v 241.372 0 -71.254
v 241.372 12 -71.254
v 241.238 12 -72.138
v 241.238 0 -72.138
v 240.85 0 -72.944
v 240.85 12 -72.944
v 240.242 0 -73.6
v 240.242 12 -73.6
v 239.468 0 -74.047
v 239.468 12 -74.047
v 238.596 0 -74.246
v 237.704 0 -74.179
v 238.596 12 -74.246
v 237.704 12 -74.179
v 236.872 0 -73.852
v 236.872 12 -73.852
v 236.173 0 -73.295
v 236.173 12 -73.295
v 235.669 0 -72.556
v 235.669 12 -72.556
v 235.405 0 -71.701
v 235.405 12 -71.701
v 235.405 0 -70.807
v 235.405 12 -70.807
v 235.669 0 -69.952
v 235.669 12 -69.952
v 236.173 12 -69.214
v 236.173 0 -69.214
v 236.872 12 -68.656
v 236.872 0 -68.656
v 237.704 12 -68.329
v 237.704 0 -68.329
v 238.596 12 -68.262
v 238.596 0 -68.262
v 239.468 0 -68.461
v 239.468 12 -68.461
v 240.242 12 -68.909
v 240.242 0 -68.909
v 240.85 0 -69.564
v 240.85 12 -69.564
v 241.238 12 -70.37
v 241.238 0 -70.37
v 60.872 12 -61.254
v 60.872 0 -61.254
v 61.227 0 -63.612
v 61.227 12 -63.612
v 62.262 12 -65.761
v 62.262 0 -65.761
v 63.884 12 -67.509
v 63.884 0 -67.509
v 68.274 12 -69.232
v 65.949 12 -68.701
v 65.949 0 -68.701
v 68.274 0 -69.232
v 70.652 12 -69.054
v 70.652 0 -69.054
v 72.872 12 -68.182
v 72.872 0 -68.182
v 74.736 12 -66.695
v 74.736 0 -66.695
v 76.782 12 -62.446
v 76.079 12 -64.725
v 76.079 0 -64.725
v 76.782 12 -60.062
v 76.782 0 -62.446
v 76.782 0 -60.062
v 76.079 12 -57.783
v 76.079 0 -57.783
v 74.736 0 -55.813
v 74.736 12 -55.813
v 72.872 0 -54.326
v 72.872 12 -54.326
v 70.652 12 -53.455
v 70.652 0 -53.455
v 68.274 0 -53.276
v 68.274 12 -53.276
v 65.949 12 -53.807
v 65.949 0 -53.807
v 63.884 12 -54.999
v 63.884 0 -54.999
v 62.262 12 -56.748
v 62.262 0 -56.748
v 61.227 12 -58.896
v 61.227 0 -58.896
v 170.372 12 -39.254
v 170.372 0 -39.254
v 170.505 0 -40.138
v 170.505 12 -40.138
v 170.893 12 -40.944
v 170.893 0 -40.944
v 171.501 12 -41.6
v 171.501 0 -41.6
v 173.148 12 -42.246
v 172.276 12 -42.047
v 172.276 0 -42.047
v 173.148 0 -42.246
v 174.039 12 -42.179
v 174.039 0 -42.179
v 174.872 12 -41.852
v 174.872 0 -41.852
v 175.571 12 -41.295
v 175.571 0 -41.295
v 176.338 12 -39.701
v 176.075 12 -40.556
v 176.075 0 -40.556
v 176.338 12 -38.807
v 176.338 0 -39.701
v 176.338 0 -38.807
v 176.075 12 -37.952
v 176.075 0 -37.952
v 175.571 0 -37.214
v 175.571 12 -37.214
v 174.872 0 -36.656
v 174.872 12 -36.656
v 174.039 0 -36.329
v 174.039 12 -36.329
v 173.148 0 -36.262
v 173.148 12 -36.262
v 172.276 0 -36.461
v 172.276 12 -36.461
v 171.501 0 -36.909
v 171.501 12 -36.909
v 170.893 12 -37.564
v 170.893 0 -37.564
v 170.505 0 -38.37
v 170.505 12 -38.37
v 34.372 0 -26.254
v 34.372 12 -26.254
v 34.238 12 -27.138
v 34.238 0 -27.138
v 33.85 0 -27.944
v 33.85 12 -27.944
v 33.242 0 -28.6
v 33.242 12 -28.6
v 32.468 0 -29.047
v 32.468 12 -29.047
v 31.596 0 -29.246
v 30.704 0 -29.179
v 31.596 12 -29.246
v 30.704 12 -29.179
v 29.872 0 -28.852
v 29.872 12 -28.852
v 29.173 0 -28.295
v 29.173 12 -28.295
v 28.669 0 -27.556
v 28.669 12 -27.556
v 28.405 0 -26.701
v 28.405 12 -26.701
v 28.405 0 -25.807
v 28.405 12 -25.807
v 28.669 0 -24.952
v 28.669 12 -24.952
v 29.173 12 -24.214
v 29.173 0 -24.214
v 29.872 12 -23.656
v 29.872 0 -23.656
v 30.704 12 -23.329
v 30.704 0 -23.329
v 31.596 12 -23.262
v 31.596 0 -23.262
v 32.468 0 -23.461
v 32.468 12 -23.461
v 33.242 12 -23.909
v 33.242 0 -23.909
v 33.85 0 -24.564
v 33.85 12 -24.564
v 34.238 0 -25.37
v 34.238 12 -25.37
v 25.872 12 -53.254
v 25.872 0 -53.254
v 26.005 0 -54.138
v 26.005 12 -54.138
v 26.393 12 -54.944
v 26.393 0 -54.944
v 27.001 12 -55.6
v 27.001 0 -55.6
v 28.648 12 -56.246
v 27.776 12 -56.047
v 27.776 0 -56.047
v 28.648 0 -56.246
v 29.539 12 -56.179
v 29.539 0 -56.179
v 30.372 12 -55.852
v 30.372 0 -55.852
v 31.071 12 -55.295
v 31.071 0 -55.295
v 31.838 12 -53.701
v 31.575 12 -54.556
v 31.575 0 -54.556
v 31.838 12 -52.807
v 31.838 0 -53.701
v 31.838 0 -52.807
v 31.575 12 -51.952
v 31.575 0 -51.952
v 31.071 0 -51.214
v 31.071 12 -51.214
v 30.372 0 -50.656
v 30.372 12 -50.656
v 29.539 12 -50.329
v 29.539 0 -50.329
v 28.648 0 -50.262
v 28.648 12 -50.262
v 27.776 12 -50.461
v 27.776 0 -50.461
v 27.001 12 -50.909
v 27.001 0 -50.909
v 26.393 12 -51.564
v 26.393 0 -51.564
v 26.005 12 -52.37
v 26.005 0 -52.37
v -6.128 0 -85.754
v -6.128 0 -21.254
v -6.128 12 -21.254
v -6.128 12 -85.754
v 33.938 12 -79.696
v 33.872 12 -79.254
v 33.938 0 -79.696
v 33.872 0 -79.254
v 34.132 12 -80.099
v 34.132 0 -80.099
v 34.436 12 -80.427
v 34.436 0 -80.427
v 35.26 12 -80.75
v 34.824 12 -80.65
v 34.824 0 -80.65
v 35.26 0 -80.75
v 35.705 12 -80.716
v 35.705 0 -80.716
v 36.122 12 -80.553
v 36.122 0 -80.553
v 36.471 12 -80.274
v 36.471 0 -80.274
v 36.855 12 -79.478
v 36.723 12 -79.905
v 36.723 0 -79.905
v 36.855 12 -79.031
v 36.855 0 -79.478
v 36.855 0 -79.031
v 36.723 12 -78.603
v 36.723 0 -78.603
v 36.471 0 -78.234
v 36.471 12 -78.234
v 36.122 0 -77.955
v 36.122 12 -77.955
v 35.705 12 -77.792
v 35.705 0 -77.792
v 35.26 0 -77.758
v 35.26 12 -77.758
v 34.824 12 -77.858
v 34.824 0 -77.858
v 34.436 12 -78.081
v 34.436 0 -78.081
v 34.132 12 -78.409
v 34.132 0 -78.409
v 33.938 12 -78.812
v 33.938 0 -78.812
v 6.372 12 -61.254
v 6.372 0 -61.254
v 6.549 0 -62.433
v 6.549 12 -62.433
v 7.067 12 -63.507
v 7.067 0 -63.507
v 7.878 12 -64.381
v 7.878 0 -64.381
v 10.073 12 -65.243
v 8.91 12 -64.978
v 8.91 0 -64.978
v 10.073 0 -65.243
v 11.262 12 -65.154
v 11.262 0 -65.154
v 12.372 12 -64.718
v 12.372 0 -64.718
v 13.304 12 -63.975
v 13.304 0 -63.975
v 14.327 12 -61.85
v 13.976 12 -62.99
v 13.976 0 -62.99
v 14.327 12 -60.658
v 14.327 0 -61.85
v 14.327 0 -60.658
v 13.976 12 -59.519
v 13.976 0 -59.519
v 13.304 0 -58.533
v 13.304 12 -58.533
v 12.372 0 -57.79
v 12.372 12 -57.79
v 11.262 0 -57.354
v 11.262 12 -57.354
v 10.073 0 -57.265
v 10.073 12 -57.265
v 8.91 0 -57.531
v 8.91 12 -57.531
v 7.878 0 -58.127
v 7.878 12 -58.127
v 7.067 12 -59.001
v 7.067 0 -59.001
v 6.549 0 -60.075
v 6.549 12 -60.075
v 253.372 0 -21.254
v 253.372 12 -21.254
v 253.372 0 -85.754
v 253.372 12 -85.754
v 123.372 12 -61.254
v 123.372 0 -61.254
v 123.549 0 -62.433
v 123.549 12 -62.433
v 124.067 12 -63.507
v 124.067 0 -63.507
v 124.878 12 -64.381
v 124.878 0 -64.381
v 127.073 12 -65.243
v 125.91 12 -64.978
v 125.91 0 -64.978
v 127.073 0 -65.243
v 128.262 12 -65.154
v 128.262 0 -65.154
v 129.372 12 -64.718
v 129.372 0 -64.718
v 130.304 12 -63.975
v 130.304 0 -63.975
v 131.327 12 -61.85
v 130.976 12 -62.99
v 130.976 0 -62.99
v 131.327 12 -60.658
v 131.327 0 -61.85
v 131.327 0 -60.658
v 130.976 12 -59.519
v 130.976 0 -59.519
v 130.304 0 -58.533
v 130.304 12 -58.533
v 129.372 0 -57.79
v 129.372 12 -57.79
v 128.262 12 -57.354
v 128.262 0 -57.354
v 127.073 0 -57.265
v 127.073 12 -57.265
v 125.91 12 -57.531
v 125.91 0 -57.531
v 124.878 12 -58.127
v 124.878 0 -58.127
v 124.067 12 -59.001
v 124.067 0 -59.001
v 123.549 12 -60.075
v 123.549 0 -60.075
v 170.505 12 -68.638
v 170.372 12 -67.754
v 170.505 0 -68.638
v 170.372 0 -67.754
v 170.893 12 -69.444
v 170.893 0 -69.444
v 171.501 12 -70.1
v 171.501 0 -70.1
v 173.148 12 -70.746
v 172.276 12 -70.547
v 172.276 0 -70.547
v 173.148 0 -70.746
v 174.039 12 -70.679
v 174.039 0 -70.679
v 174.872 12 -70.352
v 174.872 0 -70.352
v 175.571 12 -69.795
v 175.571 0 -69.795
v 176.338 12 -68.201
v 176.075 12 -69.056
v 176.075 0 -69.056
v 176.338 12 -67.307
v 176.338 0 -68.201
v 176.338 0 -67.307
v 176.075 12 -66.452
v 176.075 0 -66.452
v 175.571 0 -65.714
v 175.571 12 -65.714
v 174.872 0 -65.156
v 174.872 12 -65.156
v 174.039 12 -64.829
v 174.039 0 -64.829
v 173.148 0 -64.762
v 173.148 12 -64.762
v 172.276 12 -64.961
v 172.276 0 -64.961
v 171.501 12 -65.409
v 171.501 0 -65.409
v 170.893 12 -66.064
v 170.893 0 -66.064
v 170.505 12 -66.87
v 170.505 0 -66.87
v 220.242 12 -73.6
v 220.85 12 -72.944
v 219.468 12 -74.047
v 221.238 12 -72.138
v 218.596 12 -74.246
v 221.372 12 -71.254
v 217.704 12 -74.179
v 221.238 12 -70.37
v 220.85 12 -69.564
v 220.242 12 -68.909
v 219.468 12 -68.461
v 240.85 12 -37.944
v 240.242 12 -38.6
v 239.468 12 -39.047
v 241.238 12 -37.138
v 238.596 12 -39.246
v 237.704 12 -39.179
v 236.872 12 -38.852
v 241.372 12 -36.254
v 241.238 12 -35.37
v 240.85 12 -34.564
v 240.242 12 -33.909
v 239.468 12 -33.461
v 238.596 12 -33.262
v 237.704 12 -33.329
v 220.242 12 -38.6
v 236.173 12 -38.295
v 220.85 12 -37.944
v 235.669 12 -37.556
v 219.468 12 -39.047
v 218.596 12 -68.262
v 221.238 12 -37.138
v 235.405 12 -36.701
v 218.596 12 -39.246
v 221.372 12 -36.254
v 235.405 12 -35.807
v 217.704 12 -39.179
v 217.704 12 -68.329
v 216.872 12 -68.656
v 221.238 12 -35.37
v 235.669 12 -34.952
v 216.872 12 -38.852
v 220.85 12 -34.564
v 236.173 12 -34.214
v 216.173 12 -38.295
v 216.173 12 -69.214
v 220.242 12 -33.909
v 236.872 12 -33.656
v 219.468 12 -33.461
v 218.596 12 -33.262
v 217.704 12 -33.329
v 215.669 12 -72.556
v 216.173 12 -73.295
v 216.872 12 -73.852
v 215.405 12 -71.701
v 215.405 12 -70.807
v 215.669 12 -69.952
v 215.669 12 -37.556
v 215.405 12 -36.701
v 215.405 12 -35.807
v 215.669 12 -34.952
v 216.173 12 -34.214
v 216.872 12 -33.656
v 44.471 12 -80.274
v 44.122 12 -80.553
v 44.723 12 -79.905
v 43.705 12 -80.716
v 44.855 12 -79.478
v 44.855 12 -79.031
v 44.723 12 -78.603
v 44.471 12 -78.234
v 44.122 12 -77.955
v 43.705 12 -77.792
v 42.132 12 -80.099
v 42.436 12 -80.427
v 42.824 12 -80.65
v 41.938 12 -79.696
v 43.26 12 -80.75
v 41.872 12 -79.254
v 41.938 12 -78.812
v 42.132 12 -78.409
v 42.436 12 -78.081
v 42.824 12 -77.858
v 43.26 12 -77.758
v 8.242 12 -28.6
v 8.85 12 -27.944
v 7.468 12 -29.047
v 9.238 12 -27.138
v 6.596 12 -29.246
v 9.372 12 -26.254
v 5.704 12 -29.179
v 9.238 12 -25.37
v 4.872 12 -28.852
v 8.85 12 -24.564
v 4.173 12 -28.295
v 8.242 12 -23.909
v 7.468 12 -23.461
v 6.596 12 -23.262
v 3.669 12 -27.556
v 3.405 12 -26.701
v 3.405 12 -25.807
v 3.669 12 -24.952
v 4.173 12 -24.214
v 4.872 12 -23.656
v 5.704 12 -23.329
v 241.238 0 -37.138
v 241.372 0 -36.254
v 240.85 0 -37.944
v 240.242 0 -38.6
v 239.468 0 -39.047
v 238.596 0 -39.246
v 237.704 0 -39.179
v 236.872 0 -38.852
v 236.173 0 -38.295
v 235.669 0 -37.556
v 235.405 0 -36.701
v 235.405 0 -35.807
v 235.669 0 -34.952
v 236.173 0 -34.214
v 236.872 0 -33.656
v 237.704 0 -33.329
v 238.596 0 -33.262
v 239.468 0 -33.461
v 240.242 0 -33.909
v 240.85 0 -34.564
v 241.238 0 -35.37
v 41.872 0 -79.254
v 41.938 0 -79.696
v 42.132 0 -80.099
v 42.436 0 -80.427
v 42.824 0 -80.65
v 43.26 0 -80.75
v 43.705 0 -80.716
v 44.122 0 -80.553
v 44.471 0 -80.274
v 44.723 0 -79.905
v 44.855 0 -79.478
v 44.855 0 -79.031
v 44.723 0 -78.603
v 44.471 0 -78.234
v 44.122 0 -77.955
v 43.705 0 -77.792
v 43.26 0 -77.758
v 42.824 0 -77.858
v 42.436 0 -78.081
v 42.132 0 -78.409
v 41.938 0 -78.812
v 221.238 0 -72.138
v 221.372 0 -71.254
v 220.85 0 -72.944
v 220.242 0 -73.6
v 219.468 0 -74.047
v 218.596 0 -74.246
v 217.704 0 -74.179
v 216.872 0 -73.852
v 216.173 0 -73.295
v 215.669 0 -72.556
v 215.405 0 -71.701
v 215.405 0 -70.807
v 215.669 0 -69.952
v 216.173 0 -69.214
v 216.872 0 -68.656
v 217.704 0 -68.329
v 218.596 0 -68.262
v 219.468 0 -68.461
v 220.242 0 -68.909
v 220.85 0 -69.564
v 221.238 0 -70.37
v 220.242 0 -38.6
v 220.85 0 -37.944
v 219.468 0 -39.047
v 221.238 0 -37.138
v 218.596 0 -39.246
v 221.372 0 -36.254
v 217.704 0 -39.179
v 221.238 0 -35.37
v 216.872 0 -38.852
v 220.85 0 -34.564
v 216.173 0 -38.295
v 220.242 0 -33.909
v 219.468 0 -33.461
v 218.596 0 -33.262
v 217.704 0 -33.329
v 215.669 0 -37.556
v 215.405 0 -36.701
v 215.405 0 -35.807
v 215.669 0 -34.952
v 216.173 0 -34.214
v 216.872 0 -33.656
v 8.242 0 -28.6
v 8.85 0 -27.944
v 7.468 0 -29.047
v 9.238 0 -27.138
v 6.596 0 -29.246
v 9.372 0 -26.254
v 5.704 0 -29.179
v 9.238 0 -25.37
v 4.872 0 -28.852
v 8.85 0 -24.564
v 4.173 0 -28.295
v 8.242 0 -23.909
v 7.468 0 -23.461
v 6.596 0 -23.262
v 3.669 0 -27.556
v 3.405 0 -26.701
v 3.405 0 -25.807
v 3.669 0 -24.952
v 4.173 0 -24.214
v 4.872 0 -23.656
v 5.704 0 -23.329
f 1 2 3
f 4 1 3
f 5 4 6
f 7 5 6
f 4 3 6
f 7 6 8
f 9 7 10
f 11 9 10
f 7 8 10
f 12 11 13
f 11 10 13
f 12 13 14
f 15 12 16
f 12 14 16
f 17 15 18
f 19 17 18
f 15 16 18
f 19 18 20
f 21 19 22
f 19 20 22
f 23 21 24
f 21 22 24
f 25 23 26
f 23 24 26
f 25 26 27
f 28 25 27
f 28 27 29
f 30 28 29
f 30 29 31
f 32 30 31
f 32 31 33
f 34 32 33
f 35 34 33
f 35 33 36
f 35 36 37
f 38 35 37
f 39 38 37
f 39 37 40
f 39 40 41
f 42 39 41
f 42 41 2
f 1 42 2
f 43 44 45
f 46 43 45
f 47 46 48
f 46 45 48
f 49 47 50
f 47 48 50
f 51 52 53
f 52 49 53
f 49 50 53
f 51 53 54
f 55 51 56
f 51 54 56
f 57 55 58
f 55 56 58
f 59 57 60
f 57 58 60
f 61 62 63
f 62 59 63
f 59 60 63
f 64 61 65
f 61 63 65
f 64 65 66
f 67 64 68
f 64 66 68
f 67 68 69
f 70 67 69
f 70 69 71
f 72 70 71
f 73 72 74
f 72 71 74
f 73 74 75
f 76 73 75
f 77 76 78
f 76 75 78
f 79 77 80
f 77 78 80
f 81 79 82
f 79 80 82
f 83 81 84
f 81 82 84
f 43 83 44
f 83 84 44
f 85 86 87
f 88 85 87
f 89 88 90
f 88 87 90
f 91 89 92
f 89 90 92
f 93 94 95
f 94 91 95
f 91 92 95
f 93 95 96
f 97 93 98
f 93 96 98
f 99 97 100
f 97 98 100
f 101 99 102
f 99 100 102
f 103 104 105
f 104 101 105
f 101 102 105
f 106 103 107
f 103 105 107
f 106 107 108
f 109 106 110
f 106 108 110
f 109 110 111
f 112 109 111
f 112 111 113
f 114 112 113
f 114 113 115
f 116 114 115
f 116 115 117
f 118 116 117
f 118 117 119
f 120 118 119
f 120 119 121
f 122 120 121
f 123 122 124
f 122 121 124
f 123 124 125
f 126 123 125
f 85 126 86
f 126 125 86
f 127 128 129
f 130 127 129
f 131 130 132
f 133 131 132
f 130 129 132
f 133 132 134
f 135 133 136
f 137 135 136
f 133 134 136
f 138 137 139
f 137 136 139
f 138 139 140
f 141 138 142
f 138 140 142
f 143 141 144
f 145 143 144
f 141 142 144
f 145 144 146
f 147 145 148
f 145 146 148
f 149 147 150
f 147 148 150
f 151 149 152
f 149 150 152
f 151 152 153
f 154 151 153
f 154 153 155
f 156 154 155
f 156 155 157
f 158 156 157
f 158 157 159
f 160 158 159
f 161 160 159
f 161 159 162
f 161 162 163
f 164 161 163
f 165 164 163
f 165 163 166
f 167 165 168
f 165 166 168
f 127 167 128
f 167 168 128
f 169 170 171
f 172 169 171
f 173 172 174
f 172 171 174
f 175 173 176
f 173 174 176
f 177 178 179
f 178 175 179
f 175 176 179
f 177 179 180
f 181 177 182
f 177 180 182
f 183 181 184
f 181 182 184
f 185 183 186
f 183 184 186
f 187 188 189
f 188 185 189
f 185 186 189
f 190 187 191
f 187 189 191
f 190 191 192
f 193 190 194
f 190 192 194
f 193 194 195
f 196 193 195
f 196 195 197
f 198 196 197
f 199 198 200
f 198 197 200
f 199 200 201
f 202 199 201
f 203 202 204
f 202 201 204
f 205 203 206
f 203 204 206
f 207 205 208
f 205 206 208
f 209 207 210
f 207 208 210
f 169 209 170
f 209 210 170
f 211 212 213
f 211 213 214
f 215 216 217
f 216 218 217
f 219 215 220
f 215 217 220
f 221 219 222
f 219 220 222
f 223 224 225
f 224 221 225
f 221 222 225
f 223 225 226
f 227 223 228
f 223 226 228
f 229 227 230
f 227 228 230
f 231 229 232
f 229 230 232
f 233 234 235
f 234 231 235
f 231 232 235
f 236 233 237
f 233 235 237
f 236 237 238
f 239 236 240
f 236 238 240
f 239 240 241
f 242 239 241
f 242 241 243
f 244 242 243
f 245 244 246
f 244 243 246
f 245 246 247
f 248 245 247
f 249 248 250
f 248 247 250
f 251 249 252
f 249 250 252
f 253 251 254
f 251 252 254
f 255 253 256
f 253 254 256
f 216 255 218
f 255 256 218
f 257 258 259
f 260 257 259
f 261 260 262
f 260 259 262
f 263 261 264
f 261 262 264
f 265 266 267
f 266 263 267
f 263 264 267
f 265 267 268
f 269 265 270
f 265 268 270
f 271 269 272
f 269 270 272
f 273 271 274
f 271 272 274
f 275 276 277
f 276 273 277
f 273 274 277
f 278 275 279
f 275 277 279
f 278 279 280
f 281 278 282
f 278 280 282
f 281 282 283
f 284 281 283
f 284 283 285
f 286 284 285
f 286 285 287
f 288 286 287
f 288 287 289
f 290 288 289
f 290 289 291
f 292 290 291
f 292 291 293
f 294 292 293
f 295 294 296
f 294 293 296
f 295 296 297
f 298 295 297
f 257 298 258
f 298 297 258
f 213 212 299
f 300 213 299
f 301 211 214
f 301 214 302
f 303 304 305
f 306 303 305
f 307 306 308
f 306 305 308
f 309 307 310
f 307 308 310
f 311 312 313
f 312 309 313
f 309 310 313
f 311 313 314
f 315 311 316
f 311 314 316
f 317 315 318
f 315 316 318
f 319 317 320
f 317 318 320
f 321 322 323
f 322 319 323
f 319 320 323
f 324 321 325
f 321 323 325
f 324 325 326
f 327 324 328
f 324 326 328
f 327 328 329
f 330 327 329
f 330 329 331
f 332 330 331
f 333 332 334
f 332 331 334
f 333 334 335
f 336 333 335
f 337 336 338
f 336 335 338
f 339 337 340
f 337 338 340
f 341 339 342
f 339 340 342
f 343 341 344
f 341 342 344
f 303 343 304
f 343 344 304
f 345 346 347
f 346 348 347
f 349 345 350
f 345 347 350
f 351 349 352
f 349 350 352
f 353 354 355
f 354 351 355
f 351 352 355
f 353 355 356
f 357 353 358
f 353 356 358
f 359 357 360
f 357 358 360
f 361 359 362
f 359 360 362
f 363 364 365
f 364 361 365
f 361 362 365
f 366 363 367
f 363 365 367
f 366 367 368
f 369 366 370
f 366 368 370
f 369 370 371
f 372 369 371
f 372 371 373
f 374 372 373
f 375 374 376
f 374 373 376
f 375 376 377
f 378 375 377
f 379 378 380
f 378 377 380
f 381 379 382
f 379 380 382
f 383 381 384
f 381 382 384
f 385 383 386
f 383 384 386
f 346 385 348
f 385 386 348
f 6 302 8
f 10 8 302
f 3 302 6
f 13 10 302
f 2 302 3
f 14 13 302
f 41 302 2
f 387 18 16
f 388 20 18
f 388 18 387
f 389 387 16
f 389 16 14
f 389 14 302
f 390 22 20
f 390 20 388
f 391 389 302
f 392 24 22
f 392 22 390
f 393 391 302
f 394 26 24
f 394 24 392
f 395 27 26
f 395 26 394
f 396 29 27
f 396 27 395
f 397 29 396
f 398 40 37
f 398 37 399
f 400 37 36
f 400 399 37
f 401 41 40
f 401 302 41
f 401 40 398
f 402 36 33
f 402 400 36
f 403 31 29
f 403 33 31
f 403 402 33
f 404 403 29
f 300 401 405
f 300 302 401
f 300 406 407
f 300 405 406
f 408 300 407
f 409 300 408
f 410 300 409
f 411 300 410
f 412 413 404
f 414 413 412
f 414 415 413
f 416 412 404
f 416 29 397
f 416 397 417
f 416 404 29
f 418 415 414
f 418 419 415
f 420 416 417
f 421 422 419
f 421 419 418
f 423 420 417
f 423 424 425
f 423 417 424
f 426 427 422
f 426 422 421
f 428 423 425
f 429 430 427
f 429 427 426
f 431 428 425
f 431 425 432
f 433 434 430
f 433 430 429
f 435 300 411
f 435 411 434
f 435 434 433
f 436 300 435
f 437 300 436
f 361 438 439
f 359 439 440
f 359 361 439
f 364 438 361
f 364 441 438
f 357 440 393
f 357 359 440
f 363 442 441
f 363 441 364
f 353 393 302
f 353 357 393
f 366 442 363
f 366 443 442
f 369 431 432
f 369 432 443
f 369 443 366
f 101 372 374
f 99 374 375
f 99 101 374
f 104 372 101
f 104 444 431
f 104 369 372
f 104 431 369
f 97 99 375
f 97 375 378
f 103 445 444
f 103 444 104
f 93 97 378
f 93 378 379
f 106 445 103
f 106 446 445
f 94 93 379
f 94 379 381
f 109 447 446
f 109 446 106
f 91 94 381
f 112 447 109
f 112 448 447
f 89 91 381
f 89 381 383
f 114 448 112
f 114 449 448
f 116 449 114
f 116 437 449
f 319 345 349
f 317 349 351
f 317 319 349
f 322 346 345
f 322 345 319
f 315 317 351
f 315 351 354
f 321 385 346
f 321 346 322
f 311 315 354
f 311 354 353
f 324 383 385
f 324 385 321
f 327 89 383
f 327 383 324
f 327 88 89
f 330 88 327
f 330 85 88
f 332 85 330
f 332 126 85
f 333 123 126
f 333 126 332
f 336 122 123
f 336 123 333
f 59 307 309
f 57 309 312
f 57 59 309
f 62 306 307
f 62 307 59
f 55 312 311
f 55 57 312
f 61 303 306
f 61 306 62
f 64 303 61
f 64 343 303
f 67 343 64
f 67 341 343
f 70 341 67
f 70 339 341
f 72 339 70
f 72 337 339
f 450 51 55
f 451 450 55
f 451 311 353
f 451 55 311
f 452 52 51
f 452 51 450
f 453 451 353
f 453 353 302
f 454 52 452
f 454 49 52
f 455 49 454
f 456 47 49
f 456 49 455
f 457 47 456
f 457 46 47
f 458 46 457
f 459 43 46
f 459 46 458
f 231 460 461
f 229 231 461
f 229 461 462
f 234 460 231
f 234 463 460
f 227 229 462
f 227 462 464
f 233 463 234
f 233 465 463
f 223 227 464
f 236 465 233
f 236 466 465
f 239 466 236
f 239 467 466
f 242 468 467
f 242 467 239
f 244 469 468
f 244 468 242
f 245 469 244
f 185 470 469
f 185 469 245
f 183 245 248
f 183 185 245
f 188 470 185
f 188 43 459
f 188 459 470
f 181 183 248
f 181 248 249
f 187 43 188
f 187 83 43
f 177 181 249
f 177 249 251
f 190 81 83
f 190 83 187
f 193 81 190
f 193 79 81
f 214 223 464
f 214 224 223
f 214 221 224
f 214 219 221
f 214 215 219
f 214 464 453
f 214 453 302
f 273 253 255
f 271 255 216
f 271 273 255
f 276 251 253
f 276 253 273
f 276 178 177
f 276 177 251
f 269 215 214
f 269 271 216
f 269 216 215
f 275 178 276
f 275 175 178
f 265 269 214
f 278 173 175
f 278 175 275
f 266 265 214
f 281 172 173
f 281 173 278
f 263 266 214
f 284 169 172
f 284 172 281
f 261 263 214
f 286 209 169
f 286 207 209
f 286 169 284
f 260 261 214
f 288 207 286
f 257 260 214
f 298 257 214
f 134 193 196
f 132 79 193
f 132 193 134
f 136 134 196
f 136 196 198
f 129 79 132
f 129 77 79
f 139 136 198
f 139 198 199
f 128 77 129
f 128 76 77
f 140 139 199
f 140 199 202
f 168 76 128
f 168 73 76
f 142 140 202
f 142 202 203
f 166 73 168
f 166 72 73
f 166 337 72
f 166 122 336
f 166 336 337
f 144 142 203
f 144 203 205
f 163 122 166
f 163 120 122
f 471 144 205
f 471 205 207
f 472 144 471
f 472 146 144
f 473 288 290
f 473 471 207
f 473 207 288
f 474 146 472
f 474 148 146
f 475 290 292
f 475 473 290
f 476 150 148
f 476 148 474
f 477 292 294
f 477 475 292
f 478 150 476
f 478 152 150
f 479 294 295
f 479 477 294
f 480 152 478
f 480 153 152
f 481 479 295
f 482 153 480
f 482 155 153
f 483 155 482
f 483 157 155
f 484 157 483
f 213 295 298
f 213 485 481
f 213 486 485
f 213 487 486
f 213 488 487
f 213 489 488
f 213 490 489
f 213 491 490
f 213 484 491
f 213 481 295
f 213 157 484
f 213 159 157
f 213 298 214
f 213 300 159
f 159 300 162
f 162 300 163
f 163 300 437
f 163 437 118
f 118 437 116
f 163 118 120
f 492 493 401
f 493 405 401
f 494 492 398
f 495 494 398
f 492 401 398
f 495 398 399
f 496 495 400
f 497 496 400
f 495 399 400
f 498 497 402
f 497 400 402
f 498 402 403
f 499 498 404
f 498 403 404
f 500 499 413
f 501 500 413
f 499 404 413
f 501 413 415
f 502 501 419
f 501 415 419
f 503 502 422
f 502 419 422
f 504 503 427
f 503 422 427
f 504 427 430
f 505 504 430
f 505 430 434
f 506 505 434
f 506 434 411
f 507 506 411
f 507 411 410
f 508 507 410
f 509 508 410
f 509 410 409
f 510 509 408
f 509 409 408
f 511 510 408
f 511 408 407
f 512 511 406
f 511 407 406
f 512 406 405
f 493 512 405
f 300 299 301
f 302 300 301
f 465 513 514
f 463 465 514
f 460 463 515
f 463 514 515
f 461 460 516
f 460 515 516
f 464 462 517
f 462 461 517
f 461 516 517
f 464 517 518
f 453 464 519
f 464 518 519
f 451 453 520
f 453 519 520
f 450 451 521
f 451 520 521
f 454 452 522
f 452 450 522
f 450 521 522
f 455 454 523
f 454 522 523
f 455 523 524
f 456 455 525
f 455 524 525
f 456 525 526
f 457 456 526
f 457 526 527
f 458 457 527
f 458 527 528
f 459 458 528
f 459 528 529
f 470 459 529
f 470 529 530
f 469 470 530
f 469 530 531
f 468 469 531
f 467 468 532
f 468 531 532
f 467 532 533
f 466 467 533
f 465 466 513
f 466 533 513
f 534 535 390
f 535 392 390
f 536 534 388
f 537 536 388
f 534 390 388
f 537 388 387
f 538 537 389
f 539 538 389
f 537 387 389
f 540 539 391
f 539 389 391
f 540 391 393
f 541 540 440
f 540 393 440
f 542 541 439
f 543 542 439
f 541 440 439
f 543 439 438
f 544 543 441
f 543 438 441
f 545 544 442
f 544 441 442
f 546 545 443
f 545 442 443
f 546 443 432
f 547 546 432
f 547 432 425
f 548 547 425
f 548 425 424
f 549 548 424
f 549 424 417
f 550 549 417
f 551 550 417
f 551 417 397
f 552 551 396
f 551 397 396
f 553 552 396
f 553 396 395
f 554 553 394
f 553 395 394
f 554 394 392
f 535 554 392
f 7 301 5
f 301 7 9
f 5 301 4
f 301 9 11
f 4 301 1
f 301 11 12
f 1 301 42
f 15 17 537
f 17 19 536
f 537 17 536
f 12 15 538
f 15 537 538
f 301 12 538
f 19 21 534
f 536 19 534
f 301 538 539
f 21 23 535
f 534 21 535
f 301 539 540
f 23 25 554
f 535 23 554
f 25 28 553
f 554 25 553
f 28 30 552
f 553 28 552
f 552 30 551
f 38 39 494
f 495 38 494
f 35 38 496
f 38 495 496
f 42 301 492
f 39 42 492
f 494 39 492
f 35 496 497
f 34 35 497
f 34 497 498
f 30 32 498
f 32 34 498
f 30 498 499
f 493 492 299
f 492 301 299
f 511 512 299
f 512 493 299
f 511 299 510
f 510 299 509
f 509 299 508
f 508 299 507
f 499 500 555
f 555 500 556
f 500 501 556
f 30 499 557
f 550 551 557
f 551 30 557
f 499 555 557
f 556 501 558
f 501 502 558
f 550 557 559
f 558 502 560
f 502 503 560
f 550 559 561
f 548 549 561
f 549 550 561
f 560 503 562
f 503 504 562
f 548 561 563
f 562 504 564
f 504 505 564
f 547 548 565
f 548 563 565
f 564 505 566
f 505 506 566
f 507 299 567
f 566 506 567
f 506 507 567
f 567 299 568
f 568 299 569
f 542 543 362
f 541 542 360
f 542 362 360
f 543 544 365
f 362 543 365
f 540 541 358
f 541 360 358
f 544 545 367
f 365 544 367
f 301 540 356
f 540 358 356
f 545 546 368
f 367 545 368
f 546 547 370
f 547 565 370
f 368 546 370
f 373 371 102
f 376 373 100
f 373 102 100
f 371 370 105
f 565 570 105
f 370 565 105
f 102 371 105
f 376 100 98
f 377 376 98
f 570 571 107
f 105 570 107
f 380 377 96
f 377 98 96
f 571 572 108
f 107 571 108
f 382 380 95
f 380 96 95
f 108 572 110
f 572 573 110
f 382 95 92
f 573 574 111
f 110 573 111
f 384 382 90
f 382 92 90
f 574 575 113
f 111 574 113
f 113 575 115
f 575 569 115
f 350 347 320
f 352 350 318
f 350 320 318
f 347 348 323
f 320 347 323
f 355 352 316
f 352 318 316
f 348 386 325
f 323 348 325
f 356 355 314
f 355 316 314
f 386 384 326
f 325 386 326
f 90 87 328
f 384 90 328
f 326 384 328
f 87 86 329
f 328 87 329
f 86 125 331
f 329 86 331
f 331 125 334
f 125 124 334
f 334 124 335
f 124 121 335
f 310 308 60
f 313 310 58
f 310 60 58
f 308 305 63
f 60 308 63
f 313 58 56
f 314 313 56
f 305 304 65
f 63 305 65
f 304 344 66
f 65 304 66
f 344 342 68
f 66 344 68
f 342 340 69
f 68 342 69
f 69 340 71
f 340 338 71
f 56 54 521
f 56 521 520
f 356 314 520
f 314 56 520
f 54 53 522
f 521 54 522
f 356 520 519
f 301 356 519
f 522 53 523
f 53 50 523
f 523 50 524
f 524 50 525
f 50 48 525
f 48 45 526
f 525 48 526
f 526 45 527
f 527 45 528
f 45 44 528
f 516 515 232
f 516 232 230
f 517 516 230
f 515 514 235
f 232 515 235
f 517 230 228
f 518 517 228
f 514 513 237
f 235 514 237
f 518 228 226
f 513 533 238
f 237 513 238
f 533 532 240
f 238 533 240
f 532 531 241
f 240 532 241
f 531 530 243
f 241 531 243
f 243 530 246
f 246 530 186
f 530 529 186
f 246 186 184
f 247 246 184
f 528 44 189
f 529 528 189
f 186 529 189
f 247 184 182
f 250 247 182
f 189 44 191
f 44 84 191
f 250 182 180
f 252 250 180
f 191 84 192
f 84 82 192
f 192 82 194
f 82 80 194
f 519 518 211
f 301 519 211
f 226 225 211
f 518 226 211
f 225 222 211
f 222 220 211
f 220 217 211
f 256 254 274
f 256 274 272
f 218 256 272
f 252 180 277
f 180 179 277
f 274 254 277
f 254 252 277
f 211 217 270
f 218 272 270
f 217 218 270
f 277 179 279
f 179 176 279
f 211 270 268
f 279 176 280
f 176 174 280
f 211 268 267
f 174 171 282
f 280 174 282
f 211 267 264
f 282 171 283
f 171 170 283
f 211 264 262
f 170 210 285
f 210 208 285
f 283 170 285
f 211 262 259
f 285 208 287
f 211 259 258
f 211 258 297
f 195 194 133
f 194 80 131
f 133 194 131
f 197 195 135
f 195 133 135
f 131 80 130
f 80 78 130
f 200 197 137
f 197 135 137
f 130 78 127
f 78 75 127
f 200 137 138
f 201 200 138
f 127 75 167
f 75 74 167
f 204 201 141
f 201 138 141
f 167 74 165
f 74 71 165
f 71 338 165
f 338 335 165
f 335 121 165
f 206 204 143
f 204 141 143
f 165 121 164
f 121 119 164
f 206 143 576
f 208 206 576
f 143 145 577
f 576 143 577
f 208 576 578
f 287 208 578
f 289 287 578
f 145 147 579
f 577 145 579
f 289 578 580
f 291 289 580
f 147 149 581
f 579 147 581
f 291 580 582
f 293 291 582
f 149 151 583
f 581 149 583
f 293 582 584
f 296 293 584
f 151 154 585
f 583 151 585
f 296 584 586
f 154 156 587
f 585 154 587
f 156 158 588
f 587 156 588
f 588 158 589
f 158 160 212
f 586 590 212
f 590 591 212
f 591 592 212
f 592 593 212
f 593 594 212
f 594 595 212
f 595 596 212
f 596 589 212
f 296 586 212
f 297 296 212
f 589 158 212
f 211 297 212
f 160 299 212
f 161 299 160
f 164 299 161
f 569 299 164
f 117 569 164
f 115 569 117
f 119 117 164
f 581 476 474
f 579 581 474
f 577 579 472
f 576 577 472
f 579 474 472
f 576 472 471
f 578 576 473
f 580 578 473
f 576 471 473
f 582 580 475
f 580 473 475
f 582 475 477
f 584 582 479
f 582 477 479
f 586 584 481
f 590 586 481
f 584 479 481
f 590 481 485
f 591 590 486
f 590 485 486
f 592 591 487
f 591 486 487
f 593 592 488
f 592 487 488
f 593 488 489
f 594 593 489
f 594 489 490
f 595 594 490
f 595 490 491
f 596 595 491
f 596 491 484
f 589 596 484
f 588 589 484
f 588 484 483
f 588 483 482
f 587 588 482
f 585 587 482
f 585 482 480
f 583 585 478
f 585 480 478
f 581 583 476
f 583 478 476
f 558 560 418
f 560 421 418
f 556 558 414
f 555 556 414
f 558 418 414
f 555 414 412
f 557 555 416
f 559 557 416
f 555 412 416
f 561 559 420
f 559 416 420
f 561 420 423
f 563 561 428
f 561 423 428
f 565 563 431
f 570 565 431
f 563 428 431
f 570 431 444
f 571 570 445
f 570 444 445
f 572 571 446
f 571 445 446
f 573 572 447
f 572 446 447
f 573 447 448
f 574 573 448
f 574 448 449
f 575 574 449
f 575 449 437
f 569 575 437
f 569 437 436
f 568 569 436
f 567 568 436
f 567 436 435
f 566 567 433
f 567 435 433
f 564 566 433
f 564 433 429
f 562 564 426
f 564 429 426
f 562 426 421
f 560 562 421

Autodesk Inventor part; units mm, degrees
ref_plane "YZ Plane" through (0, 0, 0) normal (1, 0, 0) x (0, 1, 0)
ref_plane "XZ Plane" through (0, 0, 0) normal (0, 1, 0) x (-1, 0, 0)
ref_plane "XY Plane" through (0, 0, 0) normal (0, 0, 1) x (1, 0, 0)
sketch "Boceto1" plane through (0, 0, 0) normal (0, 1, 0) x (-1, 0, 0)
  line L0 (6.1283, -21.2541) -> (6.1283, -85.7541)
  line L1 (6.1283, -85.7541) -> (-253.3717, -85.7541)
  line L2 (6.1283, -21.2541) -> (-253.3717, -21.2541)
  line L3 (-253.3717, -21.2541) -> (-253.3717, -85.7541)
  circle A0 centre (-127.3717, -61.2541) radius 4
  circle A1 centre (-10.3717, -61.2541) radius 4
  circle A2 centre (-68.8717, -61.2541) radius 8
  circle A3 centre (-35.3717, -79.2541) radius 1.5
  circle A4 centre (-43.3717, -79.2541) radius 1.5
  circle A5 centre (-28.8717, -53.2541) radius 3
  circle A6 centre (-173.3717, -67.7541) radius 3
  circle A7 centre (-173.3717, -39.2541) radius 3
  dimension "d0" = 64.5
  dimension "d22" = 8
  dimension "d23" = 8
  dimension "d27" = 16
  dimension "d103" = 58.5
  dimension "d104" = 117
  dimension "d105" = 3
  dimension "d106" = 3
  dimension "d115" = 6.5
  dimension "d121" = 259.5
  dimension "d122" = 126
  dimension "d128" = 6
  dimension "d129" = 35
  dimension "d130" = 32
  dimension "d131" = 6
  dimension "d132" = 6
  dimension "d133" = 80
  dimension "d134" = 18
  dimension "d135" = 80
  dimension "d136" = 18
  dimension "d143" = 40
  dimension "d144" = 40
  dimension "d145" = 40
  dimension "d149" = 8
  dimension "d150" = 41.5
extrude "Extrusion3" add sketch "Boceto1" along normal blind 12
sketch "Sketch2" plane through (0, 12, 0) normal (0, 1, 0) x (1, 0, 0)
  circle A0 centre (6.3717, 26.2541) radius 3
  line L0 (-6.1283, 21.2541) -> (253.3717, 21.2541)
  line L1 (-6.1283, 85.7541) -> (-6.1283, 21.2541)
  circle A1 centre (31.3717, 26.2541) radius 3
  circle A2 centre (218.3717, 71.2541) radius 3
  circle A3 centre (238.3717, 71.2541) radius 3
  circle A4 centre (218.3717, 36.2541) radius 3
  circle A5 centre (238.3717, 36.2541) radius 3
  line L2 (253.3717, 21.2541) -> (253.3717, 85.7541)
  line L3 (253.3717, 85.7541) -> (-6.1283, 85.7541)
  point P0 (253.3717, 20.7541)
  point P1 (-7.6283, 85.7541)
  dimension "d84" = 6
  dimension "d85" = 5
  dimension "d86" = 12.5
  dimension "d87" = 6
  dimension "d88" = 25
  dimension "d91" = 6
  dimension "d92" = 6
  dimension "d93" = 6
  dimension "d94" = 6
  dimension "d95" = 15
  dimension "d98" = 15
  dimension "d99" = 15
  dimension "d100" = 20
  dimension "d101" = 20
  dimension "d146" = 35
  dimension "d147" = 35
  dimension "d148" = 15
extrude "Extrusion4" cut sketch "Sketch2" against normal blind 25 contours A0 | A1 | A2 | A3 | A4 | A5
thread "Thread1"
thread "Thread2"
thread "Rosca3"
thread "Rosca4"
thread "Rosca5"
properties part number "Columna Izquierda" material "Aluminum 6061"
